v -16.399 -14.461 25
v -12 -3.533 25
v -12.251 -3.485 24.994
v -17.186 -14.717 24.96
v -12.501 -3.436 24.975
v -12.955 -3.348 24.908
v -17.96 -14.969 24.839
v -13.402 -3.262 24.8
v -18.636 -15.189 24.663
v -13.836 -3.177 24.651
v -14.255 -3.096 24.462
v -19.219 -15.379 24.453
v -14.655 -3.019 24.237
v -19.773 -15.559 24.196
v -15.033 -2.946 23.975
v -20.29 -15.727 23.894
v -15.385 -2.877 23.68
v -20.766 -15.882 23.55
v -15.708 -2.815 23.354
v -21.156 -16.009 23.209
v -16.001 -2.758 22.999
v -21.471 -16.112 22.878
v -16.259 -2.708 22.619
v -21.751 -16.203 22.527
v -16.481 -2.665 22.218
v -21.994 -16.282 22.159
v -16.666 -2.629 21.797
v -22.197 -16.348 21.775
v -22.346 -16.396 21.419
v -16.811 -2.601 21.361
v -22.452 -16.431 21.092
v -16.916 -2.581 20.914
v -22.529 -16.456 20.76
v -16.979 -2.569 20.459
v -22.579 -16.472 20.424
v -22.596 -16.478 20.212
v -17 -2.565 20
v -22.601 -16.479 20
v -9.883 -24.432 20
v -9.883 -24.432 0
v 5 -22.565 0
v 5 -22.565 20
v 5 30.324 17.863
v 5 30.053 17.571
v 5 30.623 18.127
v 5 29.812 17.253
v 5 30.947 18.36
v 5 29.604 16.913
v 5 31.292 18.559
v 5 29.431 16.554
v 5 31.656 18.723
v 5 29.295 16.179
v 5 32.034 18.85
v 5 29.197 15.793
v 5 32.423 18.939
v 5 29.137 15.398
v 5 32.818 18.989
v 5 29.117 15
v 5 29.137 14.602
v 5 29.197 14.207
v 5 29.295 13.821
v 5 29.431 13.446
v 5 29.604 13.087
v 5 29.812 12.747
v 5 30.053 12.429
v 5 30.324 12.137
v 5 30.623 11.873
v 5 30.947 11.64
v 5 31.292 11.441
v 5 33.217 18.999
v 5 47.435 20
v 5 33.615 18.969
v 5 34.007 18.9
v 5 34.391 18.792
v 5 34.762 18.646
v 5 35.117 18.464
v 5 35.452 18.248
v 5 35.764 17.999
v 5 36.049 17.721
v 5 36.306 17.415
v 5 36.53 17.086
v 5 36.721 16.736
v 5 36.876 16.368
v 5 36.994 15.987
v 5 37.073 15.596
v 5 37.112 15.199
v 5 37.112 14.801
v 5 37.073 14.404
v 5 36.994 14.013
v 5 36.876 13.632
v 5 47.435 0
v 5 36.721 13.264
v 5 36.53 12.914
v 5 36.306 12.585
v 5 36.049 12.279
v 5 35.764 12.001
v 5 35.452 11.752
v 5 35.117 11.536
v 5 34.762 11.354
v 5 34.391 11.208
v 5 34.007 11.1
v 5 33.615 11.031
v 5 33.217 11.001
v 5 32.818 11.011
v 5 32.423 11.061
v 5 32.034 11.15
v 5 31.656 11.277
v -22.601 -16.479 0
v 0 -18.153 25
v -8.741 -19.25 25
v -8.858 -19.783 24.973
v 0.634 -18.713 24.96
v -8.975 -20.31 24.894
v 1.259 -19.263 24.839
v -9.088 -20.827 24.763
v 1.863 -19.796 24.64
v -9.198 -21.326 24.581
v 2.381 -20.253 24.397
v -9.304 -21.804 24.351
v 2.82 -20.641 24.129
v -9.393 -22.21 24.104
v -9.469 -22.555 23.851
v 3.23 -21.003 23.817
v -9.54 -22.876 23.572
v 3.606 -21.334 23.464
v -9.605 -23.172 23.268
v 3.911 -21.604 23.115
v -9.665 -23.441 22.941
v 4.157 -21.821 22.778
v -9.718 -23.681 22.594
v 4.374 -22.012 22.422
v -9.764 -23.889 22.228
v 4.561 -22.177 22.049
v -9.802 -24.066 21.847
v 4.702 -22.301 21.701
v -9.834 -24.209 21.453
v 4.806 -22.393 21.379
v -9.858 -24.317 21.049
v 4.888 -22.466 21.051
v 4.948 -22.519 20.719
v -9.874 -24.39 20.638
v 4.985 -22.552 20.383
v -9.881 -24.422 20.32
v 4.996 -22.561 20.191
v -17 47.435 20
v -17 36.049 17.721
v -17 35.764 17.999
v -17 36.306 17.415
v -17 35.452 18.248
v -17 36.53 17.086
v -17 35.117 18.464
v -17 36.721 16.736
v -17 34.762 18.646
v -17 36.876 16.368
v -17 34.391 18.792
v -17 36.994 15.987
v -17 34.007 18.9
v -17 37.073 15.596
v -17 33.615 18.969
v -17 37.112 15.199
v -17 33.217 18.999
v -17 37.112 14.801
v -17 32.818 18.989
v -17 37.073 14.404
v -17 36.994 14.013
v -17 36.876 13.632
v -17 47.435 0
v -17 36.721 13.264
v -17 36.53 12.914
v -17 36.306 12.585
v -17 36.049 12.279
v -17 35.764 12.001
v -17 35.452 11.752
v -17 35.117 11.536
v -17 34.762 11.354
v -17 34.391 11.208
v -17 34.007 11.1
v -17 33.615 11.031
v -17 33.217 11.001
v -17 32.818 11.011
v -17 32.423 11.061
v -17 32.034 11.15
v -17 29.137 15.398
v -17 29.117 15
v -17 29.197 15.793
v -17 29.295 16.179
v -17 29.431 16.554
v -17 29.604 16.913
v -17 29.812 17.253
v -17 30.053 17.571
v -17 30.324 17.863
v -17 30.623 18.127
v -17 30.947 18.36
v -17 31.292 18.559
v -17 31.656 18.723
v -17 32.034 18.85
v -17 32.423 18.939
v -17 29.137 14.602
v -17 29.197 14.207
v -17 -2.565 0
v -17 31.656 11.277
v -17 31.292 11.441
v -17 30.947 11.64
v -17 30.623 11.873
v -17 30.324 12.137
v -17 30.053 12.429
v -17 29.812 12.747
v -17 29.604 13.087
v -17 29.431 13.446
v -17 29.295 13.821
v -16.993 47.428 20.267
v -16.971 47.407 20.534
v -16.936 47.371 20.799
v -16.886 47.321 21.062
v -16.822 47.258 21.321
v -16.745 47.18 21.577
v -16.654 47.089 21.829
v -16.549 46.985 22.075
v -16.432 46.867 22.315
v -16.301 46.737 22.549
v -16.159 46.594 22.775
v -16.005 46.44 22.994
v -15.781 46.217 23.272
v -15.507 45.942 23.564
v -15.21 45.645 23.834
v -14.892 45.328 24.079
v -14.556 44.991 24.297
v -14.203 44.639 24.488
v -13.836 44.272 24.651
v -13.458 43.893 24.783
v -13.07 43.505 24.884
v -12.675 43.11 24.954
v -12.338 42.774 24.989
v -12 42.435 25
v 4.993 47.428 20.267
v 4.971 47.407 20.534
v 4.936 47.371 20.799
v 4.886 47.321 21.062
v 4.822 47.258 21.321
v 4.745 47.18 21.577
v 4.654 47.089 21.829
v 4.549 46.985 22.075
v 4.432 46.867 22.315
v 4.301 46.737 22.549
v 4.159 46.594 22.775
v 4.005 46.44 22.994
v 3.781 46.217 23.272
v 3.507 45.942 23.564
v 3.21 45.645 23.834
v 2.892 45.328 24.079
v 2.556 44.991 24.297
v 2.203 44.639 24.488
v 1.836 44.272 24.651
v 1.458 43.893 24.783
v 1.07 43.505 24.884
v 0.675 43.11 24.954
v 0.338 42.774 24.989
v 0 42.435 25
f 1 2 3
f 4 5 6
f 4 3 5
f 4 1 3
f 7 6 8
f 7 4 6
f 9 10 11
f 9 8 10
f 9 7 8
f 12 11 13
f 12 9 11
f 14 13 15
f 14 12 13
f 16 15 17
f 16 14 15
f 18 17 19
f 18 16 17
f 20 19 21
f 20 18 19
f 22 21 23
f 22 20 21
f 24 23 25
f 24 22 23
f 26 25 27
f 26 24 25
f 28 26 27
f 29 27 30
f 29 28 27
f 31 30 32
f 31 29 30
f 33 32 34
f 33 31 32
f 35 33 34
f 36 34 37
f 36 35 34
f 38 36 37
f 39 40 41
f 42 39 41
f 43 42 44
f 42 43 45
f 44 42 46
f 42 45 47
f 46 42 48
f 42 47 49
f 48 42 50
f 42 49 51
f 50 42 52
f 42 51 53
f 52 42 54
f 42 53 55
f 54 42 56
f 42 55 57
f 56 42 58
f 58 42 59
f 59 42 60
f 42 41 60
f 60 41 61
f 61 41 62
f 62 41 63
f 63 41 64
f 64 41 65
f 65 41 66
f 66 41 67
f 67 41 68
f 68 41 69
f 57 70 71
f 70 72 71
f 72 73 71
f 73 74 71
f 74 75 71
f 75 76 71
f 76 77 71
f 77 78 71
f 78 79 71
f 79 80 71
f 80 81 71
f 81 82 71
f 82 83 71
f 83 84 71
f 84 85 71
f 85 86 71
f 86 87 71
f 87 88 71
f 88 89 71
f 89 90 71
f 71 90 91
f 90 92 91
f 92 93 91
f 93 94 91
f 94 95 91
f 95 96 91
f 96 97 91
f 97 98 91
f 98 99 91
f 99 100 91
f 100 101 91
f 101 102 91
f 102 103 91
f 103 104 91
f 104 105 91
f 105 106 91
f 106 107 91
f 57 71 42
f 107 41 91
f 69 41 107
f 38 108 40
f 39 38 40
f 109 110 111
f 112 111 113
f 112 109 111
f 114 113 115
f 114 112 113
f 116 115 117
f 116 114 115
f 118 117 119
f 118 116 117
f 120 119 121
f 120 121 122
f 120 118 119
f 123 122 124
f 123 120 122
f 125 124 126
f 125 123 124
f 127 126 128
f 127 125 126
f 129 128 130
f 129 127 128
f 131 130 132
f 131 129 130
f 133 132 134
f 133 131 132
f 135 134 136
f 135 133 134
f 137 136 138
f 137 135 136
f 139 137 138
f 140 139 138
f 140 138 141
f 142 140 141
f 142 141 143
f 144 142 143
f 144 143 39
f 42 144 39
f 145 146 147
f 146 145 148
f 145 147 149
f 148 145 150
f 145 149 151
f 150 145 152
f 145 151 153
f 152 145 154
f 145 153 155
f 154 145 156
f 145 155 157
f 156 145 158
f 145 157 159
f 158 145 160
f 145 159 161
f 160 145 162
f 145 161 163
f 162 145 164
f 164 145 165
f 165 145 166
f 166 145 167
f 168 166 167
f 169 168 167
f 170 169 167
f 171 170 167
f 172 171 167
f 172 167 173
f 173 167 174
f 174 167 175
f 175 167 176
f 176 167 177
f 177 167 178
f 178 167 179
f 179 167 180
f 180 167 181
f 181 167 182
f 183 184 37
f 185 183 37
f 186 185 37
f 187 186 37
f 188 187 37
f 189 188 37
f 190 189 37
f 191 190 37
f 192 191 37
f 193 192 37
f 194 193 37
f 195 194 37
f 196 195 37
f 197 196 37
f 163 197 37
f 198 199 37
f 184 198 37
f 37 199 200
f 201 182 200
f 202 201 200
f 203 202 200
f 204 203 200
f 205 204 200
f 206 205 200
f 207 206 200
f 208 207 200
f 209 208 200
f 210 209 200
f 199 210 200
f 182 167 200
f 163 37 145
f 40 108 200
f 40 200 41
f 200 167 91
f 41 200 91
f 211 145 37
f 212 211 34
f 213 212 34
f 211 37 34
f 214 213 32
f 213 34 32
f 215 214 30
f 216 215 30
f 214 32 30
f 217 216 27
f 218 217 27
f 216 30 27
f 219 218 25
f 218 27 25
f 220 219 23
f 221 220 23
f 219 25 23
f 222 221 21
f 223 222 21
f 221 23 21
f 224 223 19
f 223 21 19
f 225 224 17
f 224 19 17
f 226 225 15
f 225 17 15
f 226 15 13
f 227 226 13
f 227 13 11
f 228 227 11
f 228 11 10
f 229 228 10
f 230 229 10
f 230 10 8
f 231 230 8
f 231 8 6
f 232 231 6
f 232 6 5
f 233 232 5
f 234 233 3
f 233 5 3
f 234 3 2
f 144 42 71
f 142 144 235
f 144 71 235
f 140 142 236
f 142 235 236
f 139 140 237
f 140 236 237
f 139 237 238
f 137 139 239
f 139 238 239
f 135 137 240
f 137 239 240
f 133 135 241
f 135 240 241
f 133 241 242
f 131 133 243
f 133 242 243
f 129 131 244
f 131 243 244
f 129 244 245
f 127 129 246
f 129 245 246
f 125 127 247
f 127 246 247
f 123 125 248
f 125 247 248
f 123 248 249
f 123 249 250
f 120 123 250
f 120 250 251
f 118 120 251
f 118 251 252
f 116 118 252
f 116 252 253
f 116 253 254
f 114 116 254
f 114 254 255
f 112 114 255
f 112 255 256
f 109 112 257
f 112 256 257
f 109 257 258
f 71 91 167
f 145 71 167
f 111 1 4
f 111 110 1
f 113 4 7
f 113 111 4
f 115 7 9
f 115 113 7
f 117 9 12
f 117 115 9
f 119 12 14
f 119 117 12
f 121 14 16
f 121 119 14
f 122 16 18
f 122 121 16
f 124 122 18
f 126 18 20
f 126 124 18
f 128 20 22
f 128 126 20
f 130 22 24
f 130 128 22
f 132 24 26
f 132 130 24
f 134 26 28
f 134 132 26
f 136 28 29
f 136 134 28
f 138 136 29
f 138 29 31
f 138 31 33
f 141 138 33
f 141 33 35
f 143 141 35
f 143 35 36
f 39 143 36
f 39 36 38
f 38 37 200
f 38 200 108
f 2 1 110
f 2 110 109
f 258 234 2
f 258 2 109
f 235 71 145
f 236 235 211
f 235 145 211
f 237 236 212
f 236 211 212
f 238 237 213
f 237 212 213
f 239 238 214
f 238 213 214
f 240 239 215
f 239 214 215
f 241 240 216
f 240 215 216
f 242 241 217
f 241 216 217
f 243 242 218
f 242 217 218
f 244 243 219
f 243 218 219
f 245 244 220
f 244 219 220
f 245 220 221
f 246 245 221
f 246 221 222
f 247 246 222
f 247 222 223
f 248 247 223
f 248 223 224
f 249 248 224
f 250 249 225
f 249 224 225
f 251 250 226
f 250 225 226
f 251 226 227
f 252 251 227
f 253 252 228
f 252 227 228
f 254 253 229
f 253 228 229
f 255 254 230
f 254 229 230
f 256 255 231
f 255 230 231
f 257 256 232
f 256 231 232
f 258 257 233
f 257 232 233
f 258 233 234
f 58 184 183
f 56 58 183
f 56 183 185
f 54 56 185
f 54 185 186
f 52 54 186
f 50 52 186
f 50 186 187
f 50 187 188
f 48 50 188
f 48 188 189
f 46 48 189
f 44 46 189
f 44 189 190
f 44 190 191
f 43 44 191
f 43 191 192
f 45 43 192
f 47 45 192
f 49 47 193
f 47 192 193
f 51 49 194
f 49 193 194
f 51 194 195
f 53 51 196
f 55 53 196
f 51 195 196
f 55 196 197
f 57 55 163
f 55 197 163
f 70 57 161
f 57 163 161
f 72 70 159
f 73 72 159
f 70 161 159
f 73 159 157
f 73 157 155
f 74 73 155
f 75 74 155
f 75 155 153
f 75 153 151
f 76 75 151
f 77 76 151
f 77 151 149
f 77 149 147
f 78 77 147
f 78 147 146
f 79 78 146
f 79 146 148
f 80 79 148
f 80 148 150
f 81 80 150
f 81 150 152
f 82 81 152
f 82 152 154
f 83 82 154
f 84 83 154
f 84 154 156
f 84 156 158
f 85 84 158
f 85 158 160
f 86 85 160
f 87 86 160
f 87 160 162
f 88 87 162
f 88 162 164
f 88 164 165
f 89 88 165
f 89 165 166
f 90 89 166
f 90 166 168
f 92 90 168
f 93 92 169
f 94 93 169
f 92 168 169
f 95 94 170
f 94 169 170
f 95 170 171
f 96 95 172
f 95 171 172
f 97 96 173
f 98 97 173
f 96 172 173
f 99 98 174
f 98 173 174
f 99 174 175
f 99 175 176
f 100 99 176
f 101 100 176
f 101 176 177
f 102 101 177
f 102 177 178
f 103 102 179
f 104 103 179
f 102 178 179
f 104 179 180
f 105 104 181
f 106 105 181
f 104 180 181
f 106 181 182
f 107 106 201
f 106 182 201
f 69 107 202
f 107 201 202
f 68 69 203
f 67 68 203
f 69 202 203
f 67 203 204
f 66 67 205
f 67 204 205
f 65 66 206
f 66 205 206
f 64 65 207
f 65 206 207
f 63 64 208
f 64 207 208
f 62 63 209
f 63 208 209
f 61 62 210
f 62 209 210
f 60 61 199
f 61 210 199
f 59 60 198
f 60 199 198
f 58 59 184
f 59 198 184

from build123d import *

# Parameters (mm, degrees)
F1_DEPTH = 25
F2_R     = 4
F3_DEPTH = 22.001
F4_R     = 5


with BuildPart() as f1:
    # F0 (on Top) → F1 (new body)
    with BuildSketch(Plane.XY):
        Polygon((5, 47.435442), (-17, 47.435442), (-17, -2.564558), (-22.601457, -16.47943), (-9.883268, -24.432269), (5, -22.564558), align=None)
    extrude(amount=F1_DEPTH)

    # F2 (on face) → F3 (cut, through all)
    with BuildSketch(Plane(origin=(-17, 0, 0), x_dir=(0, -1, 0), z_dir=(-1, 0, 0))):
        with Locations((-33.117216, 15)):
            Circle(F2_R)
    extrude(amount=-F3_DEPTH, mode=Mode.SUBTRACT)

    # F4
    f4_edges = [f1.edges().sort_by_distance(p)[0] for p in [
        (-6, 47.435442, 25),
        (-17, 22.435442, 25),
        (-19.800729, -9.521994, 25),
        (-16.242363, -20.45585, 25),
        (-2.441634, -23.498413, 25),
        (5, 12.435442, 25),
    ]]
    fillet(f4_edges, radius=F4_R)


solid = f1.part
